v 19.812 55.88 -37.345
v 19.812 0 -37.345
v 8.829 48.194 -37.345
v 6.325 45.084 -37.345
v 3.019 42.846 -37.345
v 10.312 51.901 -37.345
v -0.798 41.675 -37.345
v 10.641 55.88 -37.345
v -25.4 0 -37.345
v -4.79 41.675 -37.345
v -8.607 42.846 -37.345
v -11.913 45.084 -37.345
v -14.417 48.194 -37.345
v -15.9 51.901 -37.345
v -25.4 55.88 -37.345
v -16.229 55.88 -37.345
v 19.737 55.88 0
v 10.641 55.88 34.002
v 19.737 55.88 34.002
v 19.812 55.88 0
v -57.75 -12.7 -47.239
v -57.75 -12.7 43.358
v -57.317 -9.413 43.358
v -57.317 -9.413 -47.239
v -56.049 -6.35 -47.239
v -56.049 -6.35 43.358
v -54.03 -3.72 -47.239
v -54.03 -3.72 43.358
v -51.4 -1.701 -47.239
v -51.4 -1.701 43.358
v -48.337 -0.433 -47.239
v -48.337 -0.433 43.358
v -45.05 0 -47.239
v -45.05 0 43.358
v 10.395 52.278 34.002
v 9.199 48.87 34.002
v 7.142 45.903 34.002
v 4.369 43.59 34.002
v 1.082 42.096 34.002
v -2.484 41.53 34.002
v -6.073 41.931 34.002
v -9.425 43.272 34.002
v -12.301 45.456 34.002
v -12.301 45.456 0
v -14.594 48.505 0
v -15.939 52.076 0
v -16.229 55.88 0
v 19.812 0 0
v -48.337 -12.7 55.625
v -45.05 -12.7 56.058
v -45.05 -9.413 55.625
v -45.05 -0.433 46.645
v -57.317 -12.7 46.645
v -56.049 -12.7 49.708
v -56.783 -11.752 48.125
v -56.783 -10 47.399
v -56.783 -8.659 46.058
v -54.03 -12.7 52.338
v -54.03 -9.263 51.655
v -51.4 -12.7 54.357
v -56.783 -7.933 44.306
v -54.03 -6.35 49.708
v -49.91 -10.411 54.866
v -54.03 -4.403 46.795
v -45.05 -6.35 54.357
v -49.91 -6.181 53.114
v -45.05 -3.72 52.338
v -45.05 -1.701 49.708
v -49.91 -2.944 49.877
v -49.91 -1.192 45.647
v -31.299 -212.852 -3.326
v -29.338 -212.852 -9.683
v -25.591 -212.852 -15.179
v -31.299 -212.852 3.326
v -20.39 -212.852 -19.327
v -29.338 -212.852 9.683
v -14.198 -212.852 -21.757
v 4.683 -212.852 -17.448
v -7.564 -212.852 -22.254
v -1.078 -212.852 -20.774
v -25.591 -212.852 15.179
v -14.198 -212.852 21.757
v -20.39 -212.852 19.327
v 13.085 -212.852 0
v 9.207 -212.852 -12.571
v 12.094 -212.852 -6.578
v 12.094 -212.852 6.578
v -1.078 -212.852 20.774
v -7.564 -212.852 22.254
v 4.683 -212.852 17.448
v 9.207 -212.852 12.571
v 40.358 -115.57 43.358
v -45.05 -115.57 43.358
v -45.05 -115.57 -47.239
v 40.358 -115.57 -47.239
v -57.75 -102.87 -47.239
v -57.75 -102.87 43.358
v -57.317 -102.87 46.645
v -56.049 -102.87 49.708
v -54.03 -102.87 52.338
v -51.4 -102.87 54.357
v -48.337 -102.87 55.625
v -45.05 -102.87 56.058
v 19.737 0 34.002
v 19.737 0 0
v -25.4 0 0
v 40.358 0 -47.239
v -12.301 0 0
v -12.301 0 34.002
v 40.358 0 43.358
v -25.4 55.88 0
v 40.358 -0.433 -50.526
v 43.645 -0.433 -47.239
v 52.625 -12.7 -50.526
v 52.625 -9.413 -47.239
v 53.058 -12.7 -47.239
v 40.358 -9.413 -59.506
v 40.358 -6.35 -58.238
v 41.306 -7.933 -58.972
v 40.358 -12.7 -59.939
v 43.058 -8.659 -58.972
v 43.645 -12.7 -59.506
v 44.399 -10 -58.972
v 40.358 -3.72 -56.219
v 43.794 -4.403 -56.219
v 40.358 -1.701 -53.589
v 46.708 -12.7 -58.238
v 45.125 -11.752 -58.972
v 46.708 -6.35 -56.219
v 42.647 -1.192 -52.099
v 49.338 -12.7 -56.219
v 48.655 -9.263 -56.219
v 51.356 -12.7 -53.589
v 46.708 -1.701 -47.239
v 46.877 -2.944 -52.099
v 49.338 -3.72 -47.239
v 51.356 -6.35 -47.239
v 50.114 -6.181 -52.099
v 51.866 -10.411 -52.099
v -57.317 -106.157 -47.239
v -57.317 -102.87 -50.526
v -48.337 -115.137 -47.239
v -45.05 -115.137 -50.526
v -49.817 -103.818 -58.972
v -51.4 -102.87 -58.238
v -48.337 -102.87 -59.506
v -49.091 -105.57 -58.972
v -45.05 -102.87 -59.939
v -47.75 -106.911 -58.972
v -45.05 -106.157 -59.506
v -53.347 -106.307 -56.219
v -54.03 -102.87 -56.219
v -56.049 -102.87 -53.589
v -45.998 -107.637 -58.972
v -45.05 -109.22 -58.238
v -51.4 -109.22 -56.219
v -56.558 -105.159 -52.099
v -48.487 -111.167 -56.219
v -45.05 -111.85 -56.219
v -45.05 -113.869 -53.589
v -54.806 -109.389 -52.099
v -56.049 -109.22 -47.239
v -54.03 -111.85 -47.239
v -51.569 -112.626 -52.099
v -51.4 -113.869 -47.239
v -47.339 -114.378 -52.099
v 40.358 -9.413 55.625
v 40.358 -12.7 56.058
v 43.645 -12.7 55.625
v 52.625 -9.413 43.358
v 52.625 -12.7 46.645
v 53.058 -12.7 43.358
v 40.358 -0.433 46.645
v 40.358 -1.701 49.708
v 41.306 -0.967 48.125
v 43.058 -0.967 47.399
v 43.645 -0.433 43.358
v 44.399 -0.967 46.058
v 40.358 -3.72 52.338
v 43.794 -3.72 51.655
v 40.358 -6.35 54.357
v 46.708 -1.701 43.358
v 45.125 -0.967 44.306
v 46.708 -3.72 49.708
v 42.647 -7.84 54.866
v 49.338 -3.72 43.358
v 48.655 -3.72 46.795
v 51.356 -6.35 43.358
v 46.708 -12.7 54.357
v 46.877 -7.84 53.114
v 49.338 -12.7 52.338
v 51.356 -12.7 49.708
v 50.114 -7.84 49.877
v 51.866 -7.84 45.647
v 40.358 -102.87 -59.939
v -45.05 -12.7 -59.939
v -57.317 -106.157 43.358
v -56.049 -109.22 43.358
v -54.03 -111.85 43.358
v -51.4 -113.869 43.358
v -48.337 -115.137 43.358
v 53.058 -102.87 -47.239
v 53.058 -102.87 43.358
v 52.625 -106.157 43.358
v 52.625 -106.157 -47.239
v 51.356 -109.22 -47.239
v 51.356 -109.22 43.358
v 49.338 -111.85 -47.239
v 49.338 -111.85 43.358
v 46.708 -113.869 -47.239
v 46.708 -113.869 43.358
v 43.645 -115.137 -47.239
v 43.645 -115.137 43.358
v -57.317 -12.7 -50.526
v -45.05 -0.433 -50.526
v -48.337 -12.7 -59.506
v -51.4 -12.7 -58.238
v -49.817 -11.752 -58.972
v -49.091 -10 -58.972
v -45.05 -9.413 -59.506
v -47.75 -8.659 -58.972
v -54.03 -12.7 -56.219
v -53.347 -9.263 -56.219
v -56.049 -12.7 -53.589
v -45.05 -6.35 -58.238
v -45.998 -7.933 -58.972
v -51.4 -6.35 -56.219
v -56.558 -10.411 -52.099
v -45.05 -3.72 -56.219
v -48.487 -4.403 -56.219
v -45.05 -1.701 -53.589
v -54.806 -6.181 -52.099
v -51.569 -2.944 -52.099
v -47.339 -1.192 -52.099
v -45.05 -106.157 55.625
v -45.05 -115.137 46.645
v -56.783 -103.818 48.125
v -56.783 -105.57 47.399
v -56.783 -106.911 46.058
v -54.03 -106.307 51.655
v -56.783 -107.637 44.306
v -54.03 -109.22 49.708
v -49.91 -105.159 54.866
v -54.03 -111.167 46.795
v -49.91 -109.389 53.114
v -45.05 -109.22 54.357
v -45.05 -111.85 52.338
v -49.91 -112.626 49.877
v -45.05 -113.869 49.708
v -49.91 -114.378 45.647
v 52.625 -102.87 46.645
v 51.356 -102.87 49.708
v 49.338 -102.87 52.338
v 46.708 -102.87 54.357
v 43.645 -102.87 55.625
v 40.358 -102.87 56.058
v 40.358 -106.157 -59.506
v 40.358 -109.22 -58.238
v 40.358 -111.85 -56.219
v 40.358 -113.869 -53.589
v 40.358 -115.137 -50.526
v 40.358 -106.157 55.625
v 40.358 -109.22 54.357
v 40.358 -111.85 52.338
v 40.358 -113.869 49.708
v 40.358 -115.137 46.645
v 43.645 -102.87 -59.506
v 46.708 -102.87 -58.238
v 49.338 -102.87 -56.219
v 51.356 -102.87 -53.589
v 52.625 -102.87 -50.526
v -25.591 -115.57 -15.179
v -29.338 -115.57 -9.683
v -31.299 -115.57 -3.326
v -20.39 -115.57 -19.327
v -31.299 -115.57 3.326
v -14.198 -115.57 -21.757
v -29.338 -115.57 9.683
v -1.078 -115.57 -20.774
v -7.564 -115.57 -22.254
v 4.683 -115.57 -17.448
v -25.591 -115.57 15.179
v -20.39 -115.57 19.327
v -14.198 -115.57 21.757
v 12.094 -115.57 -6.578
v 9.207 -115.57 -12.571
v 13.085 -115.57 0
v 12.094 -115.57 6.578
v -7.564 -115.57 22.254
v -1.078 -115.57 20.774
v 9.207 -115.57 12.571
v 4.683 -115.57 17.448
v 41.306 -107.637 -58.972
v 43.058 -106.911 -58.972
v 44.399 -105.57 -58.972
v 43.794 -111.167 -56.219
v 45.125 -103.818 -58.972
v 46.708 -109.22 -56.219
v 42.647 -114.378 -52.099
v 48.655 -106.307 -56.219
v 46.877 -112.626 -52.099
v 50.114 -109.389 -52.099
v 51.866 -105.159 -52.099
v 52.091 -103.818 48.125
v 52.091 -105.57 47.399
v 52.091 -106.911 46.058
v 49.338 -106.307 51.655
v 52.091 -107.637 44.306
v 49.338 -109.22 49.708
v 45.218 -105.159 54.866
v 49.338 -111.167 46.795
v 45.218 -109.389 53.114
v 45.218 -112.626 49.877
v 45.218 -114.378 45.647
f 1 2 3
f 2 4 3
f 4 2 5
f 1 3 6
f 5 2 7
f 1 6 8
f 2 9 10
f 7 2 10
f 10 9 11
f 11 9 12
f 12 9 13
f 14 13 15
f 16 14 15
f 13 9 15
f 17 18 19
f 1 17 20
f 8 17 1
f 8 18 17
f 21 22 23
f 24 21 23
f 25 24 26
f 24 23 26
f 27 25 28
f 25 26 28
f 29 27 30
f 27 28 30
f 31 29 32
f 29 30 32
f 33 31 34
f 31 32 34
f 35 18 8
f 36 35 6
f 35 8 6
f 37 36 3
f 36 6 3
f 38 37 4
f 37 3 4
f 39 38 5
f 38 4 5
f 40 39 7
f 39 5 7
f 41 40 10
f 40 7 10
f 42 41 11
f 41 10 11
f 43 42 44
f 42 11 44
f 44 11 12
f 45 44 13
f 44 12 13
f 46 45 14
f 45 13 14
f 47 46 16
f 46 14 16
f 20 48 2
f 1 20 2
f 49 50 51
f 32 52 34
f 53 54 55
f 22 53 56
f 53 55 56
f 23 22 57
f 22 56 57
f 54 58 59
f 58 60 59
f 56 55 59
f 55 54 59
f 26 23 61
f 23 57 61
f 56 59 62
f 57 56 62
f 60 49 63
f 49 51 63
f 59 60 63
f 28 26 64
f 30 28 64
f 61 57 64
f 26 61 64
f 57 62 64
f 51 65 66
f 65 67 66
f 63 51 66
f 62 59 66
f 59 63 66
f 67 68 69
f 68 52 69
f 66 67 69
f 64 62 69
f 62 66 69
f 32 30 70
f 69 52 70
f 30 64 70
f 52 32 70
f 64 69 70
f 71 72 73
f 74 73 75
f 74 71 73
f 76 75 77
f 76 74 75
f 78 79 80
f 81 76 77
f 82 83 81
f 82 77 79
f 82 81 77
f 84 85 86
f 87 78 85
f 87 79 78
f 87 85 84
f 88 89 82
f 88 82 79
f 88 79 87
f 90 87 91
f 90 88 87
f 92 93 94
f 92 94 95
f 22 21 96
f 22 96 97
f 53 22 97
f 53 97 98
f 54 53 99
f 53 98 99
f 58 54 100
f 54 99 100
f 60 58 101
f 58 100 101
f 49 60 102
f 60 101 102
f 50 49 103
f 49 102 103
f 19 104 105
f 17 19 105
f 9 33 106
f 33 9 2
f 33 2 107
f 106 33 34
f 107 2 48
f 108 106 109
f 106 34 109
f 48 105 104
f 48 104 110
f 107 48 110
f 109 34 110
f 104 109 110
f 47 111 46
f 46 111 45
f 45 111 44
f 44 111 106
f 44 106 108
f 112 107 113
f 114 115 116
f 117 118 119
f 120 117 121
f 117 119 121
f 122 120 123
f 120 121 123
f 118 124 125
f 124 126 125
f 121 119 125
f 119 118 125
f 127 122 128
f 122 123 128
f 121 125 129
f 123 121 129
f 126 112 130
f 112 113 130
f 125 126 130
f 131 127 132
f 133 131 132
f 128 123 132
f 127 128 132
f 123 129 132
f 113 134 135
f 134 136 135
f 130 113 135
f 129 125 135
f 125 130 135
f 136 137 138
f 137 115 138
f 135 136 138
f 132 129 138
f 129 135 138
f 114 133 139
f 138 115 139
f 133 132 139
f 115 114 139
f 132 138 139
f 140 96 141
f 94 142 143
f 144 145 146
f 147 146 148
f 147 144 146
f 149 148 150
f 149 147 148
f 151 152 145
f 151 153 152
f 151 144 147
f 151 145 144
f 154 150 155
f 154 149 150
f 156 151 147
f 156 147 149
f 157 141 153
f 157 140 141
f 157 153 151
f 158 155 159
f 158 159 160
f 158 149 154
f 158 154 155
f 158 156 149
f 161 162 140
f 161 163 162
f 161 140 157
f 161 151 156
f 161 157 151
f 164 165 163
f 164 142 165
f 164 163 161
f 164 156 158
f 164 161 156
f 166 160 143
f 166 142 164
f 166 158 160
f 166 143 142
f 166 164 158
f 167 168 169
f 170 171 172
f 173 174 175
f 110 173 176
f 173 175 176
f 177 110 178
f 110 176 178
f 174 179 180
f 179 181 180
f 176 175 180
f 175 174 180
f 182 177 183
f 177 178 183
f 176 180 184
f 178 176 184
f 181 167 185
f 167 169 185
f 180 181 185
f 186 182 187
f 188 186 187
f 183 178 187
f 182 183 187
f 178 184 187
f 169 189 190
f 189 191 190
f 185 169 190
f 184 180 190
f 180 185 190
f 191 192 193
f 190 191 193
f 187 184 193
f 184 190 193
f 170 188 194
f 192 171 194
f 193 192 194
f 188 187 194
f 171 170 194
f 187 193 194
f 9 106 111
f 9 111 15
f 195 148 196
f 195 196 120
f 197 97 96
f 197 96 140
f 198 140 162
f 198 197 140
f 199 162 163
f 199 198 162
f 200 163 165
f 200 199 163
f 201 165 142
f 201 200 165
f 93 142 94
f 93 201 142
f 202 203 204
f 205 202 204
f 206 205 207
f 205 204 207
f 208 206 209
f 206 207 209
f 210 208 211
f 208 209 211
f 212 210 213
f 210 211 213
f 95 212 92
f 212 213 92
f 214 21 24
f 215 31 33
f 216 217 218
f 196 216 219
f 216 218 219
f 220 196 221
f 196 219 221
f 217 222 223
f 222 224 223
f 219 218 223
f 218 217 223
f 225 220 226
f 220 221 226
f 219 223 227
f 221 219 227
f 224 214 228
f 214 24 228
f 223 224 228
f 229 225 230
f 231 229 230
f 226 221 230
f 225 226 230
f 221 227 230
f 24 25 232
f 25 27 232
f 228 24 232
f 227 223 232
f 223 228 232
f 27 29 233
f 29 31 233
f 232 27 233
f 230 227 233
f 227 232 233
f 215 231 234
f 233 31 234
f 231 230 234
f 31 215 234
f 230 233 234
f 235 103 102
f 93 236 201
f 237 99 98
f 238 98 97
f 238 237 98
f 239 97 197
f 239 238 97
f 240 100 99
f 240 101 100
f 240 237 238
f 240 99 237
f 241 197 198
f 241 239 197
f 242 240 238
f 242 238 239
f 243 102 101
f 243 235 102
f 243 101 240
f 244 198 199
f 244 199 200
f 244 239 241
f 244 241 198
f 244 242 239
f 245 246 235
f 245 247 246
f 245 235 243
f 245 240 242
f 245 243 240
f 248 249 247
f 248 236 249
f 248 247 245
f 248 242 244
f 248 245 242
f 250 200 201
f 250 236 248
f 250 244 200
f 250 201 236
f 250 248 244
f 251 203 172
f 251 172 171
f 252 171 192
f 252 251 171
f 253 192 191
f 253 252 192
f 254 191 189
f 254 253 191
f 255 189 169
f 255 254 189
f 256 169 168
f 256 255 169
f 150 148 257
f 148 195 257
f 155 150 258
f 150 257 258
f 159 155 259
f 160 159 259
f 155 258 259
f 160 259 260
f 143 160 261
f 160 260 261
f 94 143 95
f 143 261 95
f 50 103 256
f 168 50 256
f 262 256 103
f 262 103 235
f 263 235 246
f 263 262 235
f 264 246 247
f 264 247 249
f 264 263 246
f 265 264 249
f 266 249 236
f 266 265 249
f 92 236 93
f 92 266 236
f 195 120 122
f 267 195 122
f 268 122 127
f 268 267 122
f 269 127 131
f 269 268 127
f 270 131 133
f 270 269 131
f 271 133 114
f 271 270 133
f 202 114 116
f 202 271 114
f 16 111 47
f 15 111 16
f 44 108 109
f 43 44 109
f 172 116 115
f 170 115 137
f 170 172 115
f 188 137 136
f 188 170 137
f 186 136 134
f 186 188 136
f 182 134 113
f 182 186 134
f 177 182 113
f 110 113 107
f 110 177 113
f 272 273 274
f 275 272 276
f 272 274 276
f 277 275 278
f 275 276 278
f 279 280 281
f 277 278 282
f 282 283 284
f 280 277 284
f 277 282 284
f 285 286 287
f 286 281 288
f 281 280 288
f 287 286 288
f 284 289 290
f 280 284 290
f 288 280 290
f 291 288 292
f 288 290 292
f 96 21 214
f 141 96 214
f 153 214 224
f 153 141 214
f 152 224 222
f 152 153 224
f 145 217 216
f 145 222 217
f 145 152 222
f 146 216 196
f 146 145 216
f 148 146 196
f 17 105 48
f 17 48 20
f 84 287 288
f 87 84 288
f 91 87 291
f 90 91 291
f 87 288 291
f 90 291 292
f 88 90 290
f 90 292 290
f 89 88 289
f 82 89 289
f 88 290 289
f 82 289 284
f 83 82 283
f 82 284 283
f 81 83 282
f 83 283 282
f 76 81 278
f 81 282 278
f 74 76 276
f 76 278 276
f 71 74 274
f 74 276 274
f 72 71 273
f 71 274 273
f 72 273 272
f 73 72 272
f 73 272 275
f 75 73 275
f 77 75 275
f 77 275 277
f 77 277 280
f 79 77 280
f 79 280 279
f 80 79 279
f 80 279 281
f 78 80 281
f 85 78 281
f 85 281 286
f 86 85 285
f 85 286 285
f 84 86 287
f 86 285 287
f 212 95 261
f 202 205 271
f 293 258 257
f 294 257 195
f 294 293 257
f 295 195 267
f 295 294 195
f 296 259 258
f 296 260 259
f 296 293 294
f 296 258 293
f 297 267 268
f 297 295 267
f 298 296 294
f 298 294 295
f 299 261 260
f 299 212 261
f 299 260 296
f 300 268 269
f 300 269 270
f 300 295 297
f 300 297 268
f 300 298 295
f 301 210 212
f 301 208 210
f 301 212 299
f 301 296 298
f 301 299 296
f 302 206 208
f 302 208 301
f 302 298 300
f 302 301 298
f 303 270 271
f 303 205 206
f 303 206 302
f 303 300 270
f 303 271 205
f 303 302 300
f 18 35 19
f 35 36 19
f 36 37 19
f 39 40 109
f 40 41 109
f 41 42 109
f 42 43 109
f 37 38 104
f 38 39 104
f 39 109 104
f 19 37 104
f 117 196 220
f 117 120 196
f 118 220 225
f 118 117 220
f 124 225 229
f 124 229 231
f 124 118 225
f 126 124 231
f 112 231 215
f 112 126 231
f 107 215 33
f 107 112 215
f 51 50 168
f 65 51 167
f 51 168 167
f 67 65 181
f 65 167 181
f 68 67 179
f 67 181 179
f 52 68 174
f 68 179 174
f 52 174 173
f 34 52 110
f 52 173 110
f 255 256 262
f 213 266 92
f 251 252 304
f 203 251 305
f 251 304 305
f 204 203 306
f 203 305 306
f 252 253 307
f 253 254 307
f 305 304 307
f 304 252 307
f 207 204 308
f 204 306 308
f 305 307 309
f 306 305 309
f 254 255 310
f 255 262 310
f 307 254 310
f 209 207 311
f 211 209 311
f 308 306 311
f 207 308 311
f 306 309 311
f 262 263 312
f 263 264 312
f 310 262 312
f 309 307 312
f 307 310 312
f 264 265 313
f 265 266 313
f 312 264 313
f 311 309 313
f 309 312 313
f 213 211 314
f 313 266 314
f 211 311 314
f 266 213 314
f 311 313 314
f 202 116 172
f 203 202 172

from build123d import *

# Parameters (mm, degrees)
F0_W      = 110.8079440892
F0_H      = 115.9970648587
F1_DEPTH  = 115.57
F2_R      = 12.7
F3_R      = 22.3167764272
F4_DEPTH  = 97.282
F6_DEPTH  = 109.982
F7_DEPTH  = 25.4
F8_DEPTH  = 19.812
F9_R      = 13.4648701689
F10_DEPTH = 133.604
F11_DEPTH = 54.102


with BuildPart() as f1:
    # F0 (on Front) → F1 (new body)
    with BuildSketch(Plane.XZ):
        with Locations((-2.3461002856, -1.9405316561)):
            Rectangle(F0_W, F0_H)
    extrude(amount=F1_DEPTH)

    # F2
    f2_edges = [f1.edges().sort_by_distance(p)[0] for p in [
        (-2.3461, -115.57, 56.058001),
        (53.057872, -57.785, 56.058001),
        (-2.3461, 0, 56.058001),
        (-57.750072, -57.785, 56.058001),
        (53.057872, -115.57, -1.940532),
        (53.057872, 0, -1.940532),
        (-57.750072, -115.57, -1.940532),
        (-57.750072, 0, -1.940532),
        (-57.750072, -57.785, -59.939064),
        (-2.3461, 0, -59.939064),
        (-2.3461, -115.57, -59.939064),
        (53.057872, -57.785, -59.939064),
    ]]
    fillet(f2_edges, radius=F2_R)

    # F5 (on face) → F6 (join)
    with BuildSketch(Plane(origin=(0, 0, 0), x_dir=(-1, 0, 0), z_dir=(0, 1, 0))):
        Polygon((-19.7372511029, 0), (0, 0), (12.3010706156, 0), (12.3010706156, 34.0015627444), (-19.7372511029, 34.0015627444), align=None)
        Polygon((12.3010706156, 0), (0, 0), (0, -37.3447611928), (24.6021412313, -37.3447611928), (24.6021412313, 0), align=None)
    extrude(amount=F6_DEPTH)

    # F7 (add): faces of the model
    f7_faces = [f1.faces().sort_by_distance(p)[0] for p in [
        (0, 54.991, -18.6723805964),
        (19.7372511029, 54.991, 17.0007813722),
    ]]
    extrude(f7_faces, amount=-F7_DEPTH)

    # F8 (add): a face of the model
    f8_faces = [f1.faces().sort_by_distance(p)[0] for p in [
        (0, 54.991, -18.6723805964),
    ]]
    extrude(f8_faces, amount=F8_DEPTH)

    # F9 (on face) → F10 (cut)
    with BuildSketch(Plane(origin=(0, 0, -37.3447611928), x_dir=(1, 0, 0), z_dir=(0, 0, -1))):
        with Locations((-2.794, -54.991)):
            Circle(F9_R)
    extrude(amount=-F10_DEPTH, mode=Mode.SUBTRACT)

    # F11 (cut): a face of the model
    f11_faces = [f1.faces().sort_by_distance(p)[0] for p in [
        (-0.2401786117, 109.982, -4.6825738498),
    ]]
    extrude(f11_faces, amount=-F11_DEPTH, mode=Mode.SUBTRACT)


with BuildPart() as f4:
    # F3 (on face) → F4 (new body)
    with BuildSketch(Plane.XZ.offset(115.57)):
        with Locations((-9.2316931114, 0)):
            Circle(F3_R)
    extrude(amount=F4_DEPTH)


solid = Compound([f1.part, f4.part])
